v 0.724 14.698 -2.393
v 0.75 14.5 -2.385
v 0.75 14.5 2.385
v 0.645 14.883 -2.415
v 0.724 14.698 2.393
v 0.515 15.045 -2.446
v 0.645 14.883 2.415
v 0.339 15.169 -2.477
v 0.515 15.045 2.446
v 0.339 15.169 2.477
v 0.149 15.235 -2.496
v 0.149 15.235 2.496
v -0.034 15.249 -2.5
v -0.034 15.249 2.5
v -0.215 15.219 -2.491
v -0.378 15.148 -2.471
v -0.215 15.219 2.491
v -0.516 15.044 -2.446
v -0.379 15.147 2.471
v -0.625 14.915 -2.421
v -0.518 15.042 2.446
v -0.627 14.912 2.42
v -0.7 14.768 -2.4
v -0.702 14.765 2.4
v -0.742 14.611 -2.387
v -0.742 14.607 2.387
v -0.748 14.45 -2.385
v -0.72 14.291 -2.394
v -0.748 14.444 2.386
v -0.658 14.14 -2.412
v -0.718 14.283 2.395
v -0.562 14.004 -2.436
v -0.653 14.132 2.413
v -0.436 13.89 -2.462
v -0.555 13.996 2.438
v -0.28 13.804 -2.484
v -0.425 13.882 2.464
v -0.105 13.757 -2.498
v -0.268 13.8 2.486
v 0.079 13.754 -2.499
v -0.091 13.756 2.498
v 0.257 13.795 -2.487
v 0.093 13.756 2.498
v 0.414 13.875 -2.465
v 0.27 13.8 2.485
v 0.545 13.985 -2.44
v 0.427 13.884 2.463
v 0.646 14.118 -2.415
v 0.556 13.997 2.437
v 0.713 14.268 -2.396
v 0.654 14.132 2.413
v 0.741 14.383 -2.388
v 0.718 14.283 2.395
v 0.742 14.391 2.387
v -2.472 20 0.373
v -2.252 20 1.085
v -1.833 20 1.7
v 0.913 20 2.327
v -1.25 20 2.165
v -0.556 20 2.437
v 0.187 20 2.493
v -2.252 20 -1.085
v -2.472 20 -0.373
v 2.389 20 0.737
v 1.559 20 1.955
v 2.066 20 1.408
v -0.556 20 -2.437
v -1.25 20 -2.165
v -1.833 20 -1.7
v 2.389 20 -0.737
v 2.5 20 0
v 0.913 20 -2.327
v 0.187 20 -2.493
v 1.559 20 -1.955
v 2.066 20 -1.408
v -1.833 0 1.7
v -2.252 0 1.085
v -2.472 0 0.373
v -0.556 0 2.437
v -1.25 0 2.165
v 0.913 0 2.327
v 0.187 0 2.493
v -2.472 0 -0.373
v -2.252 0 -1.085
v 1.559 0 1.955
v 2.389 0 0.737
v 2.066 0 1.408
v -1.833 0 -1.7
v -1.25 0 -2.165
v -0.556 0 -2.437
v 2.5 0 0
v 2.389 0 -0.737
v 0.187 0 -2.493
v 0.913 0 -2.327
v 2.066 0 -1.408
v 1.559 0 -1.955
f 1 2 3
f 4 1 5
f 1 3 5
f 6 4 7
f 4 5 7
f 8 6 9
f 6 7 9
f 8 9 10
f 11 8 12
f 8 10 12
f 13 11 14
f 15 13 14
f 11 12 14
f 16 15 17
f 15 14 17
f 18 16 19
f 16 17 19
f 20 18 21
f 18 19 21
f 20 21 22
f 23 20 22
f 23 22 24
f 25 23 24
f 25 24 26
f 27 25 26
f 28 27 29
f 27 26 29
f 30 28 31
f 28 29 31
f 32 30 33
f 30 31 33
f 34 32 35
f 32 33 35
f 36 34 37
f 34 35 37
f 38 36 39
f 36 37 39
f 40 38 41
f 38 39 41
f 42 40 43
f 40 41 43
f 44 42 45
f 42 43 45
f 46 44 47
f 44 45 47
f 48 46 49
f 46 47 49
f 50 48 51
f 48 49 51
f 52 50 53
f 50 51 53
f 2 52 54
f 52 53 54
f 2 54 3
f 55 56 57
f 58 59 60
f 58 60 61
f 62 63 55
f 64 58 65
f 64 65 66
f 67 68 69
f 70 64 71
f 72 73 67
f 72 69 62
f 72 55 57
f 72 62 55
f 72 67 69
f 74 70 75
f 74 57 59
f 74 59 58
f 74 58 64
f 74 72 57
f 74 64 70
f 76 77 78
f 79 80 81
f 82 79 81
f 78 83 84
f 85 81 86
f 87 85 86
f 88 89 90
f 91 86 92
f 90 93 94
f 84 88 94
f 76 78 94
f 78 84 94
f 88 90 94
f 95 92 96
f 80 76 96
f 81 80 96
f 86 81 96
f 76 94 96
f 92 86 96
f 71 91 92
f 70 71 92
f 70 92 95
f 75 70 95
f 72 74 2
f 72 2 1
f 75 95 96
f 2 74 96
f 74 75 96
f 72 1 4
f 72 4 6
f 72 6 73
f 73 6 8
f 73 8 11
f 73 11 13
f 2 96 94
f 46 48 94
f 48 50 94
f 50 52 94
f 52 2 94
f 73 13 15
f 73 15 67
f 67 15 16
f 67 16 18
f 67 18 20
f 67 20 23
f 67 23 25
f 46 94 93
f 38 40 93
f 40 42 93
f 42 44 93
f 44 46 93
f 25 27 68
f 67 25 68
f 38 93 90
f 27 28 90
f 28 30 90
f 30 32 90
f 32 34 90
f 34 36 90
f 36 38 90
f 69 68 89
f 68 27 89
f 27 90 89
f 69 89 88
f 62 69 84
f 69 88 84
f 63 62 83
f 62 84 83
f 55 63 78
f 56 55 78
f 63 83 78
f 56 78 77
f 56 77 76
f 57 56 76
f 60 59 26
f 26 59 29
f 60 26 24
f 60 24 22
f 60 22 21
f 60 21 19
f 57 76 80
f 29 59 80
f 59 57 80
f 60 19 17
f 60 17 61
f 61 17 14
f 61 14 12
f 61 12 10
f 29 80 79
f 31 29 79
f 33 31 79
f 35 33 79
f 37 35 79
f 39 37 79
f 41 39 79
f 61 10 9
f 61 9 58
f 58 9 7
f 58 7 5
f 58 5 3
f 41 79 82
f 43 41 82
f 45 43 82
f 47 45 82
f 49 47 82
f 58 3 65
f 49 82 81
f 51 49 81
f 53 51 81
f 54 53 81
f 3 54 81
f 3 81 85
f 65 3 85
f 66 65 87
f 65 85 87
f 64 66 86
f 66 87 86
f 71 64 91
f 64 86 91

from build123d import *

# Parameters (mm, degrees)
CROQUIS1_R                        = 2.5
SALIENTE_EXTRUIR1_DEPTH           = 20
CORTAR_EXTRUIR1_REACH             = 4.5
CROQUIS2_R                        = 0.75
CORTAR_EXTRUIR1_DIRECTION_2_REACH = 4.5


with BuildPart() as part:
    # Croquis1 → Saliente-Extruir1 (new body)
    with BuildSketch(Plane(origin=(0, 0, 0), x_dir=(1, 0, 0), z_dir=(0, 1, 0))):
        Circle(CROQUIS1_R)
    extrude(amount=SALIENTE_EXTRUIR1_DEPTH)

    # Croquis2 → Cortar-Extruir1 (cut, up to next)
    with BuildSketch(Plane.XY, mode=Mode.PRIVATE) as cortar_extruir1_sk1:
        with Locations((0, 14.5)):
            Circle(CROQUIS2_R)
    cortar_extruir1_tool1 = extrude(cortar_extruir1_sk1.sketch, amount=-CORTAR_EXTRUIR1_REACH, mode=Mode.PRIVATE) & part.part
    add(cortar_extruir1_tool1.solids().sort_by_distance((0, 14.5, 0))[0], mode=Mode.SUBTRACT)

    # Croquis2 → Cortar-Extruir1 direction 2 (cut, up to next)
    with BuildSketch(Plane.XY, mode=Mode.PRIVATE) as cortar_extruir1_direction_2_sk1:
        with Locations((0, 14.5)):
            Circle(CROQUIS2_R)
    cortar_extruir1_direction_2_tool1 = extrude(cortar_extruir1_direction_2_sk1.sketch, amount=CORTAR_EXTRUIR1_DIRECTION_2_REACH, mode=Mode.PRIVATE) & part.part
    add(cortar_extruir1_direction_2_tool1.solids().sort_by_distance((0, 14.5, 0))[0], mode=Mode.SUBTRACT)


solid = part.part
